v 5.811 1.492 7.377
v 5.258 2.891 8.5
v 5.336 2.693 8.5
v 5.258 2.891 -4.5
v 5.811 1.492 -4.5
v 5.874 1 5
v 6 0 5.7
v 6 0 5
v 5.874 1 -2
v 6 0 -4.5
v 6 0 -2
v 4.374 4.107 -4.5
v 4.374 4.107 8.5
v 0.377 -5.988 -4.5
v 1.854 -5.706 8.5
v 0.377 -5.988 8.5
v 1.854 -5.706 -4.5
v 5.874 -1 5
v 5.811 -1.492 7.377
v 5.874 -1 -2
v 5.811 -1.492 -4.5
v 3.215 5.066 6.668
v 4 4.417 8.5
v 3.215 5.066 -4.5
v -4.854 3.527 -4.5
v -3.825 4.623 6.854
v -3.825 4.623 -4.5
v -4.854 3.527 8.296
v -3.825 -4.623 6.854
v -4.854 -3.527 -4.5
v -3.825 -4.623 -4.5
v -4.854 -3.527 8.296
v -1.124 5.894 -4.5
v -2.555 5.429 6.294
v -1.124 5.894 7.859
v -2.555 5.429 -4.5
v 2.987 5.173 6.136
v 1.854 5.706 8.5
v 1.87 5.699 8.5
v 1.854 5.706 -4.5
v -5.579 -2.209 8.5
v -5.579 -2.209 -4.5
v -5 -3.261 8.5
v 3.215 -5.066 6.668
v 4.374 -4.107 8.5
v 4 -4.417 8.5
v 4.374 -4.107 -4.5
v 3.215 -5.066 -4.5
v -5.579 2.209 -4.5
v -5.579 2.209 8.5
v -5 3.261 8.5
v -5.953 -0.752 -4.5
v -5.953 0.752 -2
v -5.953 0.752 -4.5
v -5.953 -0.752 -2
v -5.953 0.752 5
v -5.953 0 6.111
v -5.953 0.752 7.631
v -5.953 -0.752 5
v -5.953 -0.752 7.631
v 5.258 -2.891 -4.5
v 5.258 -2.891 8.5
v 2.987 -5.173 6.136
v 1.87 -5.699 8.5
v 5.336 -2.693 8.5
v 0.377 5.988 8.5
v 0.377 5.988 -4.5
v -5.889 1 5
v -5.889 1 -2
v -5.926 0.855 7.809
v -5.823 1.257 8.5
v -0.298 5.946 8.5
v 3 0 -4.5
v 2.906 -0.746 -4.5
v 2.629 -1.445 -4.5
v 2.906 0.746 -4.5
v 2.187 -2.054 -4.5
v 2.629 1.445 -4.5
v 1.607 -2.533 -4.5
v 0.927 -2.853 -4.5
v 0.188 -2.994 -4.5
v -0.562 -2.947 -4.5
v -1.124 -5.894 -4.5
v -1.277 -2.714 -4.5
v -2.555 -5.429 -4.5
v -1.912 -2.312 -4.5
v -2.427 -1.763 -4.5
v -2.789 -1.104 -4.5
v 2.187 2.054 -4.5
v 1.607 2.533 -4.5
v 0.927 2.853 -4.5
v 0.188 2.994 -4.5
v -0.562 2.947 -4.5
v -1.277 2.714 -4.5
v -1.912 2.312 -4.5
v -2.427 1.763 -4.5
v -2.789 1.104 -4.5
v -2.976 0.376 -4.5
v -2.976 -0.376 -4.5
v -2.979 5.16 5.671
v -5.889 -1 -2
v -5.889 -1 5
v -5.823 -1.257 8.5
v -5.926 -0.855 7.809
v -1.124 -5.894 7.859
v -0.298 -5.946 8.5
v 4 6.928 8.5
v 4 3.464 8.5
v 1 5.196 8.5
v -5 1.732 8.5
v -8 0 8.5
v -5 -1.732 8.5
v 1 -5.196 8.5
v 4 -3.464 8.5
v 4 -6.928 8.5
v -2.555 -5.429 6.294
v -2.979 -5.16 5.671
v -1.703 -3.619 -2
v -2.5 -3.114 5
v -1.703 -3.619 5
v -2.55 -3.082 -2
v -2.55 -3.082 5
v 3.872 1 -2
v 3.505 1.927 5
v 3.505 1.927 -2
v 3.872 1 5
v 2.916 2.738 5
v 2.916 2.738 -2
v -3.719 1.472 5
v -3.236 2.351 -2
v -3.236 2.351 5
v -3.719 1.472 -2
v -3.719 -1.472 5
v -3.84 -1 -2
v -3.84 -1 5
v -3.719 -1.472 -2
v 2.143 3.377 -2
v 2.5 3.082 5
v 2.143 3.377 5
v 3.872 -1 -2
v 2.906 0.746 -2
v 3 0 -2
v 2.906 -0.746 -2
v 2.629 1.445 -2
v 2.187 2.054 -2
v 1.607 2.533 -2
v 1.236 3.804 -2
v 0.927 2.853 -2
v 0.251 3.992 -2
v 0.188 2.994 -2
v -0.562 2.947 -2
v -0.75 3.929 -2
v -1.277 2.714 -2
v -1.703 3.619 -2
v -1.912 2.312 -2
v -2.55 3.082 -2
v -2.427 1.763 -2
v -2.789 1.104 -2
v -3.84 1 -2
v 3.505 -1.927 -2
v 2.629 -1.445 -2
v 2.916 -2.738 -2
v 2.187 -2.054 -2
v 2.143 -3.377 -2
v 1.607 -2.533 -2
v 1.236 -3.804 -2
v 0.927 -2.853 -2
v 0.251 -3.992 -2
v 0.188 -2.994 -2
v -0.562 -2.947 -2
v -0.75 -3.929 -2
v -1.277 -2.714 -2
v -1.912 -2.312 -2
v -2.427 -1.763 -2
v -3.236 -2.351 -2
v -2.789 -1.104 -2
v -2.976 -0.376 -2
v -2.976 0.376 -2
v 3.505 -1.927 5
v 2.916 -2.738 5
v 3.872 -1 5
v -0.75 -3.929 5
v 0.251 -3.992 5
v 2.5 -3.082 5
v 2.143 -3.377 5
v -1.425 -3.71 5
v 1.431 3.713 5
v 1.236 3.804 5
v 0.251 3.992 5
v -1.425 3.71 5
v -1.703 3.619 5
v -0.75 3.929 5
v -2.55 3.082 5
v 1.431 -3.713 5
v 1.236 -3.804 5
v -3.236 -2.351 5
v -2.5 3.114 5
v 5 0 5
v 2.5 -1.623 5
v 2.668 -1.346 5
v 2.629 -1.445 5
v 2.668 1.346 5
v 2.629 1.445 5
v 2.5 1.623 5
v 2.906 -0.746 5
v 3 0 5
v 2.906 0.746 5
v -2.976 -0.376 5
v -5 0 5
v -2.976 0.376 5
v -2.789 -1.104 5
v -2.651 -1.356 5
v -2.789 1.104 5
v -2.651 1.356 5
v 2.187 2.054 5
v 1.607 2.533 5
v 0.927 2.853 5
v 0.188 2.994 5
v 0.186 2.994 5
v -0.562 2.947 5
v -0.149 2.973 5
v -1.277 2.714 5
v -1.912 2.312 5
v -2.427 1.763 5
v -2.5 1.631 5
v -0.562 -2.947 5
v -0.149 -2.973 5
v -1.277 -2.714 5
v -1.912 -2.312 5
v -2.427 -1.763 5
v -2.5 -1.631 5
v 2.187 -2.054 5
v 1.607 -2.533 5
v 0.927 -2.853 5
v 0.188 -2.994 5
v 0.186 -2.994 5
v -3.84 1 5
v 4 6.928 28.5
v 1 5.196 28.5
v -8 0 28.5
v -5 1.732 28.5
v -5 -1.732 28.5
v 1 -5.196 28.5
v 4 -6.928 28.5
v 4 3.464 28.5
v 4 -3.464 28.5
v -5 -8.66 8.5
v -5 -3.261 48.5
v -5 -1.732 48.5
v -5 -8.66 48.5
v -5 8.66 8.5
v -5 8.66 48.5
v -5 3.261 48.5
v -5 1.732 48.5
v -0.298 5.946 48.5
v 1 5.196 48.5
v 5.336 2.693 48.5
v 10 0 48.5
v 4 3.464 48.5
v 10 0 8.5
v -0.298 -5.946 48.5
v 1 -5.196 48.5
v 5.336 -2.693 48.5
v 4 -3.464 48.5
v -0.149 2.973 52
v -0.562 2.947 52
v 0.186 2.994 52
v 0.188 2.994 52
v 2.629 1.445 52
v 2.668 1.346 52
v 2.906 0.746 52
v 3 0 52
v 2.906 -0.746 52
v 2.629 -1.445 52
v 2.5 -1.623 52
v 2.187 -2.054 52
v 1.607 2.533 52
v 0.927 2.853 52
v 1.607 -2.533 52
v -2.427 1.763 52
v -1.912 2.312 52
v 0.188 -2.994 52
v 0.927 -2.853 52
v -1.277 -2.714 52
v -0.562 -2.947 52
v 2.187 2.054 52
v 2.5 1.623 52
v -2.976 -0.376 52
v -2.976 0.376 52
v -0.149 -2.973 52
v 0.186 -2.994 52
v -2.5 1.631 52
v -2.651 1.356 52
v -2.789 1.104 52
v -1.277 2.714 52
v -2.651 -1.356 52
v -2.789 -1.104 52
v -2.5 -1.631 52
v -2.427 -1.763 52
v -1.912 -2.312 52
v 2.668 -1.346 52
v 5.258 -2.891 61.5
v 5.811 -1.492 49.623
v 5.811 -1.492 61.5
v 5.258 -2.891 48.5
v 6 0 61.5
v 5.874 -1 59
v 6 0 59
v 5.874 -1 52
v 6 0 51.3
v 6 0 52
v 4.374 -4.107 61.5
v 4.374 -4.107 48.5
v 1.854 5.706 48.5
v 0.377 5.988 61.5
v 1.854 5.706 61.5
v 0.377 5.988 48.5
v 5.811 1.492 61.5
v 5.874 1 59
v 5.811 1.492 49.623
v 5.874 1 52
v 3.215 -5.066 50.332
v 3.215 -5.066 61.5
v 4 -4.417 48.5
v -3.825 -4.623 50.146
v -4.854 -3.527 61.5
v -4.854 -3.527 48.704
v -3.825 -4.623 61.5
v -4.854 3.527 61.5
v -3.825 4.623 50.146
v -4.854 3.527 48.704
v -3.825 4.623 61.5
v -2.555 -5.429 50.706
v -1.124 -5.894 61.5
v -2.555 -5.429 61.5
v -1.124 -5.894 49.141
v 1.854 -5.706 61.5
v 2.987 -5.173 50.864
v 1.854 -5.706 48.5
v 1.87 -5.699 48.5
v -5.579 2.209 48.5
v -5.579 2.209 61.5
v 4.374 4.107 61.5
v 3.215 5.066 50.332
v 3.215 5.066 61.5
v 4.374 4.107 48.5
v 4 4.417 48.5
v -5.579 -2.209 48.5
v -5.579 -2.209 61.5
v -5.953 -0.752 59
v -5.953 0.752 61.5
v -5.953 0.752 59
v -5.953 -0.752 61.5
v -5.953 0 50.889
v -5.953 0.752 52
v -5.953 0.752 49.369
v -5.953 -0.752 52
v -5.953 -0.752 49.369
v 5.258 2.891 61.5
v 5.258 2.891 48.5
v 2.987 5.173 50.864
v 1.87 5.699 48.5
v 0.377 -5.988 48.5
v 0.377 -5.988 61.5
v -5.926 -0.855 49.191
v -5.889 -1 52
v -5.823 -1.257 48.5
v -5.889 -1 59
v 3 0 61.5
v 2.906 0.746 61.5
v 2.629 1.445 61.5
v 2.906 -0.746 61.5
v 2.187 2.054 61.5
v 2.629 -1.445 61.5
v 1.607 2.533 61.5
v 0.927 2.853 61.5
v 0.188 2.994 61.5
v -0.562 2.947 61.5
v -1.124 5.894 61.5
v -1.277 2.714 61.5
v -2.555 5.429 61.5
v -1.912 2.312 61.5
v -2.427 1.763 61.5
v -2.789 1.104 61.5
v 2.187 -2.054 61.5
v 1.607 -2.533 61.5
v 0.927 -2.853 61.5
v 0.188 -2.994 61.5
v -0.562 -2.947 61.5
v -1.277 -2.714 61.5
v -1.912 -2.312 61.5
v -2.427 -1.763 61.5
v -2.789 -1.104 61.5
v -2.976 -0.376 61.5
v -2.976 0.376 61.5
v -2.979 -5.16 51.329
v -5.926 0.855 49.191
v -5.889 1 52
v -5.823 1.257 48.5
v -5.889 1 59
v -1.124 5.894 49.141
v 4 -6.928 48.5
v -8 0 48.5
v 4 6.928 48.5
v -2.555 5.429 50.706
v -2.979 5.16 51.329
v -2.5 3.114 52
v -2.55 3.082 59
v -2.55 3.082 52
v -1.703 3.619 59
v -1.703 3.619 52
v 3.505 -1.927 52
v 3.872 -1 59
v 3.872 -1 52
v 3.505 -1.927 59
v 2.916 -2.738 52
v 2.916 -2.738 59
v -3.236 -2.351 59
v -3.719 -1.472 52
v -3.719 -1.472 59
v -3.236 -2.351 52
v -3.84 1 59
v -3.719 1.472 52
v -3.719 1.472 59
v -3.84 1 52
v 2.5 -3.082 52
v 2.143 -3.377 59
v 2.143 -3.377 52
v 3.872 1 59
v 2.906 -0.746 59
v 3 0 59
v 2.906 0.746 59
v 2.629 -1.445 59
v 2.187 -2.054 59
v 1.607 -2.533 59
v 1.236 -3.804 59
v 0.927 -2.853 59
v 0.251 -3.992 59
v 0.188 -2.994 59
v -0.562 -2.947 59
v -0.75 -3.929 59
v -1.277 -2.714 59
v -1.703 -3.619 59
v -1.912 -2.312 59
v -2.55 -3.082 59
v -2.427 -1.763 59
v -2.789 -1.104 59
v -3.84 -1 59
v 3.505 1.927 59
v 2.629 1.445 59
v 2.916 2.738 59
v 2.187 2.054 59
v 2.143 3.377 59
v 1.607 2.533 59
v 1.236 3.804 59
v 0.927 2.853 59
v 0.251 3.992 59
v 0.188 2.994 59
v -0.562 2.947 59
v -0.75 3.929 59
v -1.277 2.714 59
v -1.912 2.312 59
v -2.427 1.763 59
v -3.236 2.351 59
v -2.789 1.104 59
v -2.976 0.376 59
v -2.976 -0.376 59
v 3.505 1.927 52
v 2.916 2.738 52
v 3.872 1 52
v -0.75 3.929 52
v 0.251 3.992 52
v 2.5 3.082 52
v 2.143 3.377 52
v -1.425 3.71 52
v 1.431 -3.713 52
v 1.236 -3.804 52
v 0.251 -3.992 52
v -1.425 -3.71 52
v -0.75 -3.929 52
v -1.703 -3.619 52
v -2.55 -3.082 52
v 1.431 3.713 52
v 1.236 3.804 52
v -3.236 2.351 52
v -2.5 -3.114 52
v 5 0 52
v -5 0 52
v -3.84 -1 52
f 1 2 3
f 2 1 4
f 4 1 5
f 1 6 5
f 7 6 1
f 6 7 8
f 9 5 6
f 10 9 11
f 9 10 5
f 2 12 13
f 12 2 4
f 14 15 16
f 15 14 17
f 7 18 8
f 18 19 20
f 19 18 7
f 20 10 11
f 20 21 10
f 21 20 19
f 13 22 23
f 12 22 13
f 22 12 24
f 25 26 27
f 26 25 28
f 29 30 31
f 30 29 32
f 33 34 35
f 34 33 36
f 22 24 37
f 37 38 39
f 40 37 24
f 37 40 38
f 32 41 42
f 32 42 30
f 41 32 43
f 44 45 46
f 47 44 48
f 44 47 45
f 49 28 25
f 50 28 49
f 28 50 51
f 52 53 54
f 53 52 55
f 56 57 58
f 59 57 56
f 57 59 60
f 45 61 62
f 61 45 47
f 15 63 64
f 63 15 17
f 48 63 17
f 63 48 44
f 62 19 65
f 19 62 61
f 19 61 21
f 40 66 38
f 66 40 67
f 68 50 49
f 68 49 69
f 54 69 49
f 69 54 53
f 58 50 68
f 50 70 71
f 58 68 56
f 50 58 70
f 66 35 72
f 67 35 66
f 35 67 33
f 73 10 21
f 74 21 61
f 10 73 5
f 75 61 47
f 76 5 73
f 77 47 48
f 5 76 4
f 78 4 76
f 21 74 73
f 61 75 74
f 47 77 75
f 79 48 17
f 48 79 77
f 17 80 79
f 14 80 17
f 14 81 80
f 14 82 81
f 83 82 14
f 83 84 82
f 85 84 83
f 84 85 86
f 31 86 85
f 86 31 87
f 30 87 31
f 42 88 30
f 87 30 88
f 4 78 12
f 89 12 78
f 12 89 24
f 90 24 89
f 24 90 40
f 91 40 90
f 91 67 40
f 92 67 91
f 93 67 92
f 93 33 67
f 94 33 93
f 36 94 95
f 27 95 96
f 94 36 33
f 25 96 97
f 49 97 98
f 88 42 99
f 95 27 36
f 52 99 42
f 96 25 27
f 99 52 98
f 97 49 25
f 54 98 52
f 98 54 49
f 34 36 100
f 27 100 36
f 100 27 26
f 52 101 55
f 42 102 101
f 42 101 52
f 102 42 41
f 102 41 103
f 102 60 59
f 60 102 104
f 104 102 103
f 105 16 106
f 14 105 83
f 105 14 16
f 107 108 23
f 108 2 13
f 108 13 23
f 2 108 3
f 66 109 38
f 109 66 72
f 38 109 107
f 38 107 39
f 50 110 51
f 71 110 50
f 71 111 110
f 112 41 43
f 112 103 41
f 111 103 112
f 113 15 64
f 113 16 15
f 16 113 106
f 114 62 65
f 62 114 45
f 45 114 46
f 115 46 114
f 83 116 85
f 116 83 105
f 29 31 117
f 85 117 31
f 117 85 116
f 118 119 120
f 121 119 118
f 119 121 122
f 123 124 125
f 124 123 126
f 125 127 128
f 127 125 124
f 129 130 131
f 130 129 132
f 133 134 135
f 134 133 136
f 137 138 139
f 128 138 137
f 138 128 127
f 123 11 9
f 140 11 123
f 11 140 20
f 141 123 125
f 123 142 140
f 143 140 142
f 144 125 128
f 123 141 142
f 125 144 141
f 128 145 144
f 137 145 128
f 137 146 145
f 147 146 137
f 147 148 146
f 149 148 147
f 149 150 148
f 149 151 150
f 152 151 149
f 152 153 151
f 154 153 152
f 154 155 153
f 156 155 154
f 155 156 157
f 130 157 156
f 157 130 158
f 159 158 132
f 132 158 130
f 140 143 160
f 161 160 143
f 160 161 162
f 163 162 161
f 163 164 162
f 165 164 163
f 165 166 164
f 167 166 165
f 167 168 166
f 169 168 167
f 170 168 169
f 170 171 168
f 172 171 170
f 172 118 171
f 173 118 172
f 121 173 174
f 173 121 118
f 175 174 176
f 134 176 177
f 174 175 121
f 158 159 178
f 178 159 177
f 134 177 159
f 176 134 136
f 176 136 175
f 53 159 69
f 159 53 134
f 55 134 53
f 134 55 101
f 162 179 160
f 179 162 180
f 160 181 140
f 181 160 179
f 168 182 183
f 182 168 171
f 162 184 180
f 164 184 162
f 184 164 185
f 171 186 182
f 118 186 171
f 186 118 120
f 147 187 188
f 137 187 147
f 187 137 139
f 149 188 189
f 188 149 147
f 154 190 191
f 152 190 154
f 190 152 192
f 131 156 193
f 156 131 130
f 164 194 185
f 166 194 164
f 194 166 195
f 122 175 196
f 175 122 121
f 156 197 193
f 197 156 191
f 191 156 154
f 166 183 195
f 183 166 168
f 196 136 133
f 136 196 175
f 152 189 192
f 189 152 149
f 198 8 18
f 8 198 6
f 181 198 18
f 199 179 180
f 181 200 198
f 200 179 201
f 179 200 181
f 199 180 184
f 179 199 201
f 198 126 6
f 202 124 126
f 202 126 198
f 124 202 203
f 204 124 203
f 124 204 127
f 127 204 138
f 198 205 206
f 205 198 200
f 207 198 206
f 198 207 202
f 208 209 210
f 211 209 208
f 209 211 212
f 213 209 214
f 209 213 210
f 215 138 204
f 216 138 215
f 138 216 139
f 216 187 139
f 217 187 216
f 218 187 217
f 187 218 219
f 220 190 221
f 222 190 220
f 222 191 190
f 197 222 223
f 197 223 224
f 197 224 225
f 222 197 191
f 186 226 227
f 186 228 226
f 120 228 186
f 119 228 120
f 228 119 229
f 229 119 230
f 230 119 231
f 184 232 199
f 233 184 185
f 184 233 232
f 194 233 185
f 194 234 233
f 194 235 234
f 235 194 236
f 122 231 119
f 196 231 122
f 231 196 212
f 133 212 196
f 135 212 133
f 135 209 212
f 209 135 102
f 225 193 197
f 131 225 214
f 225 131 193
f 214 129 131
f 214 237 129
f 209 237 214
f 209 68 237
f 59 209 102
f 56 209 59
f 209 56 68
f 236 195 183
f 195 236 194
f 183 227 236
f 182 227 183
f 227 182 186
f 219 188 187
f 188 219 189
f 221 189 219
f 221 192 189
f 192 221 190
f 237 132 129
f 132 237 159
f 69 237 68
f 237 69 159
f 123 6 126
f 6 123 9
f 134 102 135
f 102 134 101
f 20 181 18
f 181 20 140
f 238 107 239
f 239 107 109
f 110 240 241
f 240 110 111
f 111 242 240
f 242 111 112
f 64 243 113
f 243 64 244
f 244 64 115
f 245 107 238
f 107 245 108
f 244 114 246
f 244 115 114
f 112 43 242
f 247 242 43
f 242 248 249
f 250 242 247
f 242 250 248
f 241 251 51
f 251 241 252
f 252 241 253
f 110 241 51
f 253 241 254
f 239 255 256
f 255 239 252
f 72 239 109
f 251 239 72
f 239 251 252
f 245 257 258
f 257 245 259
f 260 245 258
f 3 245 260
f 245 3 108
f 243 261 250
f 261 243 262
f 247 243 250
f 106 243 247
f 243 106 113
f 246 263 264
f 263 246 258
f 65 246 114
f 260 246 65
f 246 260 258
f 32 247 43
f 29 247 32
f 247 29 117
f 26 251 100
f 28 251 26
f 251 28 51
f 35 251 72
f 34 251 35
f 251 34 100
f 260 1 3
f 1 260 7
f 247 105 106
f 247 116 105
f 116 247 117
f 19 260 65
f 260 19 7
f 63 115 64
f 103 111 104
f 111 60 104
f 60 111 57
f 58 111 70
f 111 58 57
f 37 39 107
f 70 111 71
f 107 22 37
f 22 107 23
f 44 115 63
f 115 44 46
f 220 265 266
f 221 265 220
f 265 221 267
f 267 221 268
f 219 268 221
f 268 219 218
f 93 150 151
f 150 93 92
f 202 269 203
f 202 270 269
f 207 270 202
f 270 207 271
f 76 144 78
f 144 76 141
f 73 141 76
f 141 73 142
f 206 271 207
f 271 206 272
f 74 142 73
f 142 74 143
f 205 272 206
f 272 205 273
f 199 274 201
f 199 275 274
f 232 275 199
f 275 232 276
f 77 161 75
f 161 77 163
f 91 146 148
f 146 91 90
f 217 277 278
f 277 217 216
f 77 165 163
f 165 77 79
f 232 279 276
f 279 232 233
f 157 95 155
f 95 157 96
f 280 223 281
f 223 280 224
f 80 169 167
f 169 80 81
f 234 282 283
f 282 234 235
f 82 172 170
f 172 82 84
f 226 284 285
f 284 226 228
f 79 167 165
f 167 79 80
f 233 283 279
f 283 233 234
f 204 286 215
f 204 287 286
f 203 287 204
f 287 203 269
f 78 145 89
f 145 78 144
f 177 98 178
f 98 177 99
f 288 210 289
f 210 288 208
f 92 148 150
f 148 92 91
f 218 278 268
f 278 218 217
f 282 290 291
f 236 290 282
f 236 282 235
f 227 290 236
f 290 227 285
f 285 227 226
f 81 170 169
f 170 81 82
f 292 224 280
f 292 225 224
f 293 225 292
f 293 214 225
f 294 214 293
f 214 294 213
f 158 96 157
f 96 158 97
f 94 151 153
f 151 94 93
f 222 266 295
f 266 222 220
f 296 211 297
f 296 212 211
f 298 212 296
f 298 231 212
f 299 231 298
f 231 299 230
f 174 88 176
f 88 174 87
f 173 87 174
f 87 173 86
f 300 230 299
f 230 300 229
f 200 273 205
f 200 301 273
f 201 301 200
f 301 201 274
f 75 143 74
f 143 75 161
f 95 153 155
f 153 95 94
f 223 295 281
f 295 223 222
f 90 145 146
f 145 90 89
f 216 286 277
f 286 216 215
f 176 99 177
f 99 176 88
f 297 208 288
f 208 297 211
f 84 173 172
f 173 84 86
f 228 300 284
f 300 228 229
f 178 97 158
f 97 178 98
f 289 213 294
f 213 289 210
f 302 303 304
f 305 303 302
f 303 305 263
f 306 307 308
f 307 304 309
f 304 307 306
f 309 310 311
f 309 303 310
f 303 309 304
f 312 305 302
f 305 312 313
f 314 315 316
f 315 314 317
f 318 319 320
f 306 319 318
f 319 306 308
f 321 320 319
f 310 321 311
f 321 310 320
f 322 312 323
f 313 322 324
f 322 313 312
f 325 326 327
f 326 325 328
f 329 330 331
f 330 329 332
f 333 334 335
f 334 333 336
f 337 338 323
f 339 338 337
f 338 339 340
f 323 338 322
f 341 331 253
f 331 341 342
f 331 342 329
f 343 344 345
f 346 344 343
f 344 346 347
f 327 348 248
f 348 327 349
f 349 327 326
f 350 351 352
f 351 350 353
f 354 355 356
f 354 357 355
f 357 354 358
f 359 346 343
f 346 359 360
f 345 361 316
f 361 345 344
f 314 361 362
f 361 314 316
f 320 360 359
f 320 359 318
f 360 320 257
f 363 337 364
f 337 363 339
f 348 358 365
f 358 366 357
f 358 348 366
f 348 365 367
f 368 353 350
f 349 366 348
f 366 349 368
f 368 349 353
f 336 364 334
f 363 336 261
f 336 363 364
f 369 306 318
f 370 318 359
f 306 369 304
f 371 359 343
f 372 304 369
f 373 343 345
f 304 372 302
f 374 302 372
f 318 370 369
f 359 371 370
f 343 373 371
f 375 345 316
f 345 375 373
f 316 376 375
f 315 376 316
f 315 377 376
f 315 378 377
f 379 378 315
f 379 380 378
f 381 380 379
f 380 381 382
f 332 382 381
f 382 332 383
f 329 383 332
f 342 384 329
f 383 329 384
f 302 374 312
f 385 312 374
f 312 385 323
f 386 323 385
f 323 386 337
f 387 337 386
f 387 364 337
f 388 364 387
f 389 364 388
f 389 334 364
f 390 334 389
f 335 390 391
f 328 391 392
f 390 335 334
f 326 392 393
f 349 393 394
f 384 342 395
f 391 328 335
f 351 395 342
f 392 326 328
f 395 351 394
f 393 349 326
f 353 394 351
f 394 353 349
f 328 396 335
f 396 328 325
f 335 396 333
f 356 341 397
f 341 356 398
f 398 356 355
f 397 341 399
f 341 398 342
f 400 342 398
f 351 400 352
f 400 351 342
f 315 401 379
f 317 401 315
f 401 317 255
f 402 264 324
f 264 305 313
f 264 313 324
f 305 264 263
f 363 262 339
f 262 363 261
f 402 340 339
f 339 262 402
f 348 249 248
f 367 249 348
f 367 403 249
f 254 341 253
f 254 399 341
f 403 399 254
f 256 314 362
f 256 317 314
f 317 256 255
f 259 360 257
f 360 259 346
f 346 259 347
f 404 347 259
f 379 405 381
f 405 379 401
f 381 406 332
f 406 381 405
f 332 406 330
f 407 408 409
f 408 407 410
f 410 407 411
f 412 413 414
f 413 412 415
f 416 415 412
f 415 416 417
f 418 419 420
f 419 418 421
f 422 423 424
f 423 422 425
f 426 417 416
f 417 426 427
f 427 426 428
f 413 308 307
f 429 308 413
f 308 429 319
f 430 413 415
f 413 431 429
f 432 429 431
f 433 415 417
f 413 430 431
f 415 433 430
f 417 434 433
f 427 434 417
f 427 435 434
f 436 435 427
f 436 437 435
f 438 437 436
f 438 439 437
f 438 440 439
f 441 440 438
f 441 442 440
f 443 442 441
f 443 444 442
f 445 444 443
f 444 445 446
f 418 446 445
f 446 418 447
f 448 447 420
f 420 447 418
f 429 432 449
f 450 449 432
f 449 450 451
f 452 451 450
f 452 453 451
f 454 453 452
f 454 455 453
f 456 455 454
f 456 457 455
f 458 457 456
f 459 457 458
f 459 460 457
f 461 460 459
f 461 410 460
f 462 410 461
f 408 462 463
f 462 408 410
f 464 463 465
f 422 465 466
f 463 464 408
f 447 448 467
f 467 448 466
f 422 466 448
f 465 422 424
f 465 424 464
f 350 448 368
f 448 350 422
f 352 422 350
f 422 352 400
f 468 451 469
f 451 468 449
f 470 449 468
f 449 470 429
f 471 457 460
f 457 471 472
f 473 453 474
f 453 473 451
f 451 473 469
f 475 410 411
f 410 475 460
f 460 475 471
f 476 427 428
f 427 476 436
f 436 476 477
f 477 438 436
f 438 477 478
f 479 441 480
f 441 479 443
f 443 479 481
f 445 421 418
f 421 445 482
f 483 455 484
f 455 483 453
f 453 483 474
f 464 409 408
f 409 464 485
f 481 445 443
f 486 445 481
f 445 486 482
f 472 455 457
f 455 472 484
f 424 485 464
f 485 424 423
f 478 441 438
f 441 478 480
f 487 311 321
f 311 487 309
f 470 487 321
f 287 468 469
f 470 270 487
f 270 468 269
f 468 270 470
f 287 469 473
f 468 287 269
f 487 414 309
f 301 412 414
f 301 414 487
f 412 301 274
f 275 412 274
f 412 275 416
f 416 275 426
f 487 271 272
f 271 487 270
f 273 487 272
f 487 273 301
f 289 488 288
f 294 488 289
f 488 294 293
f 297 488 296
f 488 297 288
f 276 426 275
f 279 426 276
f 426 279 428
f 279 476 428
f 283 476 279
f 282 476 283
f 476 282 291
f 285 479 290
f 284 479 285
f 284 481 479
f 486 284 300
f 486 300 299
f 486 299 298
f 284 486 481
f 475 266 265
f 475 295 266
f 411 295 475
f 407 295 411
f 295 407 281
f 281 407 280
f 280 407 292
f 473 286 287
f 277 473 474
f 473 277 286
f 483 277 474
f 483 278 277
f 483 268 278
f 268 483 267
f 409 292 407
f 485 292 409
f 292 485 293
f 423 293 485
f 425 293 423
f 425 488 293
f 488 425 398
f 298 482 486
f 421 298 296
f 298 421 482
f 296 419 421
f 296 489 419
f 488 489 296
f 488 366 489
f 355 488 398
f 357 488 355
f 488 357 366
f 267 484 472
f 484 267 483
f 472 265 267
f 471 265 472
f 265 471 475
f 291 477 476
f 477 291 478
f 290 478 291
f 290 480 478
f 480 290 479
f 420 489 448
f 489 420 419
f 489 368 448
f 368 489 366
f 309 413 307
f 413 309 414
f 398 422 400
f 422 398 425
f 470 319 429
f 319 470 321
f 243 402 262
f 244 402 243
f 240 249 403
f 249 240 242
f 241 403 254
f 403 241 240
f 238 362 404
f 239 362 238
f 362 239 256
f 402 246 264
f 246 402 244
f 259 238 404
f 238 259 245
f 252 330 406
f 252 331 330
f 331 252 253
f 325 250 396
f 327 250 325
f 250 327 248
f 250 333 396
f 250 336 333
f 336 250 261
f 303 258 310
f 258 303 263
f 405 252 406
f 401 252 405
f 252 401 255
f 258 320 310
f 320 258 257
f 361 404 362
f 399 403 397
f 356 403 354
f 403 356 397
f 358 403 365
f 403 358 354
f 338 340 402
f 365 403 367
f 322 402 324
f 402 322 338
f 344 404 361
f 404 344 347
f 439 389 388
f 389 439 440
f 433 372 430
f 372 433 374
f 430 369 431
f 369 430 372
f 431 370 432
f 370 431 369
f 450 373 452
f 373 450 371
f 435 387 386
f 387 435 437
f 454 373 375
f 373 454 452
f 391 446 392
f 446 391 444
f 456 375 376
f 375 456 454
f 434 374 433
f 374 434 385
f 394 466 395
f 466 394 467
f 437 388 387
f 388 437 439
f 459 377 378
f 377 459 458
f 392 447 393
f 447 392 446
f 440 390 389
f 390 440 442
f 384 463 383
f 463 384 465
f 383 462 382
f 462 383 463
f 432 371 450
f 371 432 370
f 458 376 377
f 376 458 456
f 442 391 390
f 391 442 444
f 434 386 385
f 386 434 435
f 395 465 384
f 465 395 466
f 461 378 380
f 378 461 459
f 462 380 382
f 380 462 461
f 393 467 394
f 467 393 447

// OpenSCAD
//soporte triangular con agujero
difference(){
    translate([0,0,8.5])
    union(){
        rotate([0,0,60])
        cylinder(r=8, h=20, $fn=3);
        cylinder(r=10, h=20, $fn=3);
        //escuadra corte en angulo
        translate([0,0,-1.75])
        rotate([0,180,180])
        cylinder(r1=10, r2=5, h=3.5, $fn=3, center=true);
        translate([0,0,-1.75])
        rotate([0,180,0])
        cylinder(r1=8, r2=5, h=3.5, $fn=3, center=true);
        //trozo cilindro
        difference(){
            difference(){
        translate([0,0,-6.5])
        cylinder(r=6, h=13, $fn=25, center=true);
        translate([0,0,-7])
        cylinder(r=4, h=7, $fn=25, center=true);}
        translate([-9,-1,-10.5])
        cube([20,2,7]);
        }
    }
    translate([0,0,-20])
    cylinder(r=3, h=100, $fn=25);
}

//segunda parte del soporte del motor
translate([0,0,57])
rotate([0,180,180])
difference(){
    translate([0,0,8.5])
    union(){
        rotate([0,0,60])
        cylinder(r=8, h=20, $fn=3);
        cylinder(r=10, h=20, $fn=3);
        //escuadra corte en angulo
        translate([0,0,-1.75])
        rotate([0,180,180])
        cylinder(r1=10, r2=5, h=3.5, $fn=3, center=true);
        translate([0,0,-1.75])
        rotate([0,180,0])
        cylinder(r1=8, r2=5, h=3.5, $fn=3, center=true);
        //trozo cilindro
        difference(){
            difference(){
        translate([0,0,-6.5])
        cylinder(r=6, h=13, $fn=25, center=true);
        translate([0,0,-7])
        cylinder(r=4, h=7, $fn=25, center=true);}
        translate([-9,-1,-10.5])
        cube([20,2,7]);
        }
    }
    translate([0,0,-20])
    cylinder(r=3, h=100, $fn=25);
}
